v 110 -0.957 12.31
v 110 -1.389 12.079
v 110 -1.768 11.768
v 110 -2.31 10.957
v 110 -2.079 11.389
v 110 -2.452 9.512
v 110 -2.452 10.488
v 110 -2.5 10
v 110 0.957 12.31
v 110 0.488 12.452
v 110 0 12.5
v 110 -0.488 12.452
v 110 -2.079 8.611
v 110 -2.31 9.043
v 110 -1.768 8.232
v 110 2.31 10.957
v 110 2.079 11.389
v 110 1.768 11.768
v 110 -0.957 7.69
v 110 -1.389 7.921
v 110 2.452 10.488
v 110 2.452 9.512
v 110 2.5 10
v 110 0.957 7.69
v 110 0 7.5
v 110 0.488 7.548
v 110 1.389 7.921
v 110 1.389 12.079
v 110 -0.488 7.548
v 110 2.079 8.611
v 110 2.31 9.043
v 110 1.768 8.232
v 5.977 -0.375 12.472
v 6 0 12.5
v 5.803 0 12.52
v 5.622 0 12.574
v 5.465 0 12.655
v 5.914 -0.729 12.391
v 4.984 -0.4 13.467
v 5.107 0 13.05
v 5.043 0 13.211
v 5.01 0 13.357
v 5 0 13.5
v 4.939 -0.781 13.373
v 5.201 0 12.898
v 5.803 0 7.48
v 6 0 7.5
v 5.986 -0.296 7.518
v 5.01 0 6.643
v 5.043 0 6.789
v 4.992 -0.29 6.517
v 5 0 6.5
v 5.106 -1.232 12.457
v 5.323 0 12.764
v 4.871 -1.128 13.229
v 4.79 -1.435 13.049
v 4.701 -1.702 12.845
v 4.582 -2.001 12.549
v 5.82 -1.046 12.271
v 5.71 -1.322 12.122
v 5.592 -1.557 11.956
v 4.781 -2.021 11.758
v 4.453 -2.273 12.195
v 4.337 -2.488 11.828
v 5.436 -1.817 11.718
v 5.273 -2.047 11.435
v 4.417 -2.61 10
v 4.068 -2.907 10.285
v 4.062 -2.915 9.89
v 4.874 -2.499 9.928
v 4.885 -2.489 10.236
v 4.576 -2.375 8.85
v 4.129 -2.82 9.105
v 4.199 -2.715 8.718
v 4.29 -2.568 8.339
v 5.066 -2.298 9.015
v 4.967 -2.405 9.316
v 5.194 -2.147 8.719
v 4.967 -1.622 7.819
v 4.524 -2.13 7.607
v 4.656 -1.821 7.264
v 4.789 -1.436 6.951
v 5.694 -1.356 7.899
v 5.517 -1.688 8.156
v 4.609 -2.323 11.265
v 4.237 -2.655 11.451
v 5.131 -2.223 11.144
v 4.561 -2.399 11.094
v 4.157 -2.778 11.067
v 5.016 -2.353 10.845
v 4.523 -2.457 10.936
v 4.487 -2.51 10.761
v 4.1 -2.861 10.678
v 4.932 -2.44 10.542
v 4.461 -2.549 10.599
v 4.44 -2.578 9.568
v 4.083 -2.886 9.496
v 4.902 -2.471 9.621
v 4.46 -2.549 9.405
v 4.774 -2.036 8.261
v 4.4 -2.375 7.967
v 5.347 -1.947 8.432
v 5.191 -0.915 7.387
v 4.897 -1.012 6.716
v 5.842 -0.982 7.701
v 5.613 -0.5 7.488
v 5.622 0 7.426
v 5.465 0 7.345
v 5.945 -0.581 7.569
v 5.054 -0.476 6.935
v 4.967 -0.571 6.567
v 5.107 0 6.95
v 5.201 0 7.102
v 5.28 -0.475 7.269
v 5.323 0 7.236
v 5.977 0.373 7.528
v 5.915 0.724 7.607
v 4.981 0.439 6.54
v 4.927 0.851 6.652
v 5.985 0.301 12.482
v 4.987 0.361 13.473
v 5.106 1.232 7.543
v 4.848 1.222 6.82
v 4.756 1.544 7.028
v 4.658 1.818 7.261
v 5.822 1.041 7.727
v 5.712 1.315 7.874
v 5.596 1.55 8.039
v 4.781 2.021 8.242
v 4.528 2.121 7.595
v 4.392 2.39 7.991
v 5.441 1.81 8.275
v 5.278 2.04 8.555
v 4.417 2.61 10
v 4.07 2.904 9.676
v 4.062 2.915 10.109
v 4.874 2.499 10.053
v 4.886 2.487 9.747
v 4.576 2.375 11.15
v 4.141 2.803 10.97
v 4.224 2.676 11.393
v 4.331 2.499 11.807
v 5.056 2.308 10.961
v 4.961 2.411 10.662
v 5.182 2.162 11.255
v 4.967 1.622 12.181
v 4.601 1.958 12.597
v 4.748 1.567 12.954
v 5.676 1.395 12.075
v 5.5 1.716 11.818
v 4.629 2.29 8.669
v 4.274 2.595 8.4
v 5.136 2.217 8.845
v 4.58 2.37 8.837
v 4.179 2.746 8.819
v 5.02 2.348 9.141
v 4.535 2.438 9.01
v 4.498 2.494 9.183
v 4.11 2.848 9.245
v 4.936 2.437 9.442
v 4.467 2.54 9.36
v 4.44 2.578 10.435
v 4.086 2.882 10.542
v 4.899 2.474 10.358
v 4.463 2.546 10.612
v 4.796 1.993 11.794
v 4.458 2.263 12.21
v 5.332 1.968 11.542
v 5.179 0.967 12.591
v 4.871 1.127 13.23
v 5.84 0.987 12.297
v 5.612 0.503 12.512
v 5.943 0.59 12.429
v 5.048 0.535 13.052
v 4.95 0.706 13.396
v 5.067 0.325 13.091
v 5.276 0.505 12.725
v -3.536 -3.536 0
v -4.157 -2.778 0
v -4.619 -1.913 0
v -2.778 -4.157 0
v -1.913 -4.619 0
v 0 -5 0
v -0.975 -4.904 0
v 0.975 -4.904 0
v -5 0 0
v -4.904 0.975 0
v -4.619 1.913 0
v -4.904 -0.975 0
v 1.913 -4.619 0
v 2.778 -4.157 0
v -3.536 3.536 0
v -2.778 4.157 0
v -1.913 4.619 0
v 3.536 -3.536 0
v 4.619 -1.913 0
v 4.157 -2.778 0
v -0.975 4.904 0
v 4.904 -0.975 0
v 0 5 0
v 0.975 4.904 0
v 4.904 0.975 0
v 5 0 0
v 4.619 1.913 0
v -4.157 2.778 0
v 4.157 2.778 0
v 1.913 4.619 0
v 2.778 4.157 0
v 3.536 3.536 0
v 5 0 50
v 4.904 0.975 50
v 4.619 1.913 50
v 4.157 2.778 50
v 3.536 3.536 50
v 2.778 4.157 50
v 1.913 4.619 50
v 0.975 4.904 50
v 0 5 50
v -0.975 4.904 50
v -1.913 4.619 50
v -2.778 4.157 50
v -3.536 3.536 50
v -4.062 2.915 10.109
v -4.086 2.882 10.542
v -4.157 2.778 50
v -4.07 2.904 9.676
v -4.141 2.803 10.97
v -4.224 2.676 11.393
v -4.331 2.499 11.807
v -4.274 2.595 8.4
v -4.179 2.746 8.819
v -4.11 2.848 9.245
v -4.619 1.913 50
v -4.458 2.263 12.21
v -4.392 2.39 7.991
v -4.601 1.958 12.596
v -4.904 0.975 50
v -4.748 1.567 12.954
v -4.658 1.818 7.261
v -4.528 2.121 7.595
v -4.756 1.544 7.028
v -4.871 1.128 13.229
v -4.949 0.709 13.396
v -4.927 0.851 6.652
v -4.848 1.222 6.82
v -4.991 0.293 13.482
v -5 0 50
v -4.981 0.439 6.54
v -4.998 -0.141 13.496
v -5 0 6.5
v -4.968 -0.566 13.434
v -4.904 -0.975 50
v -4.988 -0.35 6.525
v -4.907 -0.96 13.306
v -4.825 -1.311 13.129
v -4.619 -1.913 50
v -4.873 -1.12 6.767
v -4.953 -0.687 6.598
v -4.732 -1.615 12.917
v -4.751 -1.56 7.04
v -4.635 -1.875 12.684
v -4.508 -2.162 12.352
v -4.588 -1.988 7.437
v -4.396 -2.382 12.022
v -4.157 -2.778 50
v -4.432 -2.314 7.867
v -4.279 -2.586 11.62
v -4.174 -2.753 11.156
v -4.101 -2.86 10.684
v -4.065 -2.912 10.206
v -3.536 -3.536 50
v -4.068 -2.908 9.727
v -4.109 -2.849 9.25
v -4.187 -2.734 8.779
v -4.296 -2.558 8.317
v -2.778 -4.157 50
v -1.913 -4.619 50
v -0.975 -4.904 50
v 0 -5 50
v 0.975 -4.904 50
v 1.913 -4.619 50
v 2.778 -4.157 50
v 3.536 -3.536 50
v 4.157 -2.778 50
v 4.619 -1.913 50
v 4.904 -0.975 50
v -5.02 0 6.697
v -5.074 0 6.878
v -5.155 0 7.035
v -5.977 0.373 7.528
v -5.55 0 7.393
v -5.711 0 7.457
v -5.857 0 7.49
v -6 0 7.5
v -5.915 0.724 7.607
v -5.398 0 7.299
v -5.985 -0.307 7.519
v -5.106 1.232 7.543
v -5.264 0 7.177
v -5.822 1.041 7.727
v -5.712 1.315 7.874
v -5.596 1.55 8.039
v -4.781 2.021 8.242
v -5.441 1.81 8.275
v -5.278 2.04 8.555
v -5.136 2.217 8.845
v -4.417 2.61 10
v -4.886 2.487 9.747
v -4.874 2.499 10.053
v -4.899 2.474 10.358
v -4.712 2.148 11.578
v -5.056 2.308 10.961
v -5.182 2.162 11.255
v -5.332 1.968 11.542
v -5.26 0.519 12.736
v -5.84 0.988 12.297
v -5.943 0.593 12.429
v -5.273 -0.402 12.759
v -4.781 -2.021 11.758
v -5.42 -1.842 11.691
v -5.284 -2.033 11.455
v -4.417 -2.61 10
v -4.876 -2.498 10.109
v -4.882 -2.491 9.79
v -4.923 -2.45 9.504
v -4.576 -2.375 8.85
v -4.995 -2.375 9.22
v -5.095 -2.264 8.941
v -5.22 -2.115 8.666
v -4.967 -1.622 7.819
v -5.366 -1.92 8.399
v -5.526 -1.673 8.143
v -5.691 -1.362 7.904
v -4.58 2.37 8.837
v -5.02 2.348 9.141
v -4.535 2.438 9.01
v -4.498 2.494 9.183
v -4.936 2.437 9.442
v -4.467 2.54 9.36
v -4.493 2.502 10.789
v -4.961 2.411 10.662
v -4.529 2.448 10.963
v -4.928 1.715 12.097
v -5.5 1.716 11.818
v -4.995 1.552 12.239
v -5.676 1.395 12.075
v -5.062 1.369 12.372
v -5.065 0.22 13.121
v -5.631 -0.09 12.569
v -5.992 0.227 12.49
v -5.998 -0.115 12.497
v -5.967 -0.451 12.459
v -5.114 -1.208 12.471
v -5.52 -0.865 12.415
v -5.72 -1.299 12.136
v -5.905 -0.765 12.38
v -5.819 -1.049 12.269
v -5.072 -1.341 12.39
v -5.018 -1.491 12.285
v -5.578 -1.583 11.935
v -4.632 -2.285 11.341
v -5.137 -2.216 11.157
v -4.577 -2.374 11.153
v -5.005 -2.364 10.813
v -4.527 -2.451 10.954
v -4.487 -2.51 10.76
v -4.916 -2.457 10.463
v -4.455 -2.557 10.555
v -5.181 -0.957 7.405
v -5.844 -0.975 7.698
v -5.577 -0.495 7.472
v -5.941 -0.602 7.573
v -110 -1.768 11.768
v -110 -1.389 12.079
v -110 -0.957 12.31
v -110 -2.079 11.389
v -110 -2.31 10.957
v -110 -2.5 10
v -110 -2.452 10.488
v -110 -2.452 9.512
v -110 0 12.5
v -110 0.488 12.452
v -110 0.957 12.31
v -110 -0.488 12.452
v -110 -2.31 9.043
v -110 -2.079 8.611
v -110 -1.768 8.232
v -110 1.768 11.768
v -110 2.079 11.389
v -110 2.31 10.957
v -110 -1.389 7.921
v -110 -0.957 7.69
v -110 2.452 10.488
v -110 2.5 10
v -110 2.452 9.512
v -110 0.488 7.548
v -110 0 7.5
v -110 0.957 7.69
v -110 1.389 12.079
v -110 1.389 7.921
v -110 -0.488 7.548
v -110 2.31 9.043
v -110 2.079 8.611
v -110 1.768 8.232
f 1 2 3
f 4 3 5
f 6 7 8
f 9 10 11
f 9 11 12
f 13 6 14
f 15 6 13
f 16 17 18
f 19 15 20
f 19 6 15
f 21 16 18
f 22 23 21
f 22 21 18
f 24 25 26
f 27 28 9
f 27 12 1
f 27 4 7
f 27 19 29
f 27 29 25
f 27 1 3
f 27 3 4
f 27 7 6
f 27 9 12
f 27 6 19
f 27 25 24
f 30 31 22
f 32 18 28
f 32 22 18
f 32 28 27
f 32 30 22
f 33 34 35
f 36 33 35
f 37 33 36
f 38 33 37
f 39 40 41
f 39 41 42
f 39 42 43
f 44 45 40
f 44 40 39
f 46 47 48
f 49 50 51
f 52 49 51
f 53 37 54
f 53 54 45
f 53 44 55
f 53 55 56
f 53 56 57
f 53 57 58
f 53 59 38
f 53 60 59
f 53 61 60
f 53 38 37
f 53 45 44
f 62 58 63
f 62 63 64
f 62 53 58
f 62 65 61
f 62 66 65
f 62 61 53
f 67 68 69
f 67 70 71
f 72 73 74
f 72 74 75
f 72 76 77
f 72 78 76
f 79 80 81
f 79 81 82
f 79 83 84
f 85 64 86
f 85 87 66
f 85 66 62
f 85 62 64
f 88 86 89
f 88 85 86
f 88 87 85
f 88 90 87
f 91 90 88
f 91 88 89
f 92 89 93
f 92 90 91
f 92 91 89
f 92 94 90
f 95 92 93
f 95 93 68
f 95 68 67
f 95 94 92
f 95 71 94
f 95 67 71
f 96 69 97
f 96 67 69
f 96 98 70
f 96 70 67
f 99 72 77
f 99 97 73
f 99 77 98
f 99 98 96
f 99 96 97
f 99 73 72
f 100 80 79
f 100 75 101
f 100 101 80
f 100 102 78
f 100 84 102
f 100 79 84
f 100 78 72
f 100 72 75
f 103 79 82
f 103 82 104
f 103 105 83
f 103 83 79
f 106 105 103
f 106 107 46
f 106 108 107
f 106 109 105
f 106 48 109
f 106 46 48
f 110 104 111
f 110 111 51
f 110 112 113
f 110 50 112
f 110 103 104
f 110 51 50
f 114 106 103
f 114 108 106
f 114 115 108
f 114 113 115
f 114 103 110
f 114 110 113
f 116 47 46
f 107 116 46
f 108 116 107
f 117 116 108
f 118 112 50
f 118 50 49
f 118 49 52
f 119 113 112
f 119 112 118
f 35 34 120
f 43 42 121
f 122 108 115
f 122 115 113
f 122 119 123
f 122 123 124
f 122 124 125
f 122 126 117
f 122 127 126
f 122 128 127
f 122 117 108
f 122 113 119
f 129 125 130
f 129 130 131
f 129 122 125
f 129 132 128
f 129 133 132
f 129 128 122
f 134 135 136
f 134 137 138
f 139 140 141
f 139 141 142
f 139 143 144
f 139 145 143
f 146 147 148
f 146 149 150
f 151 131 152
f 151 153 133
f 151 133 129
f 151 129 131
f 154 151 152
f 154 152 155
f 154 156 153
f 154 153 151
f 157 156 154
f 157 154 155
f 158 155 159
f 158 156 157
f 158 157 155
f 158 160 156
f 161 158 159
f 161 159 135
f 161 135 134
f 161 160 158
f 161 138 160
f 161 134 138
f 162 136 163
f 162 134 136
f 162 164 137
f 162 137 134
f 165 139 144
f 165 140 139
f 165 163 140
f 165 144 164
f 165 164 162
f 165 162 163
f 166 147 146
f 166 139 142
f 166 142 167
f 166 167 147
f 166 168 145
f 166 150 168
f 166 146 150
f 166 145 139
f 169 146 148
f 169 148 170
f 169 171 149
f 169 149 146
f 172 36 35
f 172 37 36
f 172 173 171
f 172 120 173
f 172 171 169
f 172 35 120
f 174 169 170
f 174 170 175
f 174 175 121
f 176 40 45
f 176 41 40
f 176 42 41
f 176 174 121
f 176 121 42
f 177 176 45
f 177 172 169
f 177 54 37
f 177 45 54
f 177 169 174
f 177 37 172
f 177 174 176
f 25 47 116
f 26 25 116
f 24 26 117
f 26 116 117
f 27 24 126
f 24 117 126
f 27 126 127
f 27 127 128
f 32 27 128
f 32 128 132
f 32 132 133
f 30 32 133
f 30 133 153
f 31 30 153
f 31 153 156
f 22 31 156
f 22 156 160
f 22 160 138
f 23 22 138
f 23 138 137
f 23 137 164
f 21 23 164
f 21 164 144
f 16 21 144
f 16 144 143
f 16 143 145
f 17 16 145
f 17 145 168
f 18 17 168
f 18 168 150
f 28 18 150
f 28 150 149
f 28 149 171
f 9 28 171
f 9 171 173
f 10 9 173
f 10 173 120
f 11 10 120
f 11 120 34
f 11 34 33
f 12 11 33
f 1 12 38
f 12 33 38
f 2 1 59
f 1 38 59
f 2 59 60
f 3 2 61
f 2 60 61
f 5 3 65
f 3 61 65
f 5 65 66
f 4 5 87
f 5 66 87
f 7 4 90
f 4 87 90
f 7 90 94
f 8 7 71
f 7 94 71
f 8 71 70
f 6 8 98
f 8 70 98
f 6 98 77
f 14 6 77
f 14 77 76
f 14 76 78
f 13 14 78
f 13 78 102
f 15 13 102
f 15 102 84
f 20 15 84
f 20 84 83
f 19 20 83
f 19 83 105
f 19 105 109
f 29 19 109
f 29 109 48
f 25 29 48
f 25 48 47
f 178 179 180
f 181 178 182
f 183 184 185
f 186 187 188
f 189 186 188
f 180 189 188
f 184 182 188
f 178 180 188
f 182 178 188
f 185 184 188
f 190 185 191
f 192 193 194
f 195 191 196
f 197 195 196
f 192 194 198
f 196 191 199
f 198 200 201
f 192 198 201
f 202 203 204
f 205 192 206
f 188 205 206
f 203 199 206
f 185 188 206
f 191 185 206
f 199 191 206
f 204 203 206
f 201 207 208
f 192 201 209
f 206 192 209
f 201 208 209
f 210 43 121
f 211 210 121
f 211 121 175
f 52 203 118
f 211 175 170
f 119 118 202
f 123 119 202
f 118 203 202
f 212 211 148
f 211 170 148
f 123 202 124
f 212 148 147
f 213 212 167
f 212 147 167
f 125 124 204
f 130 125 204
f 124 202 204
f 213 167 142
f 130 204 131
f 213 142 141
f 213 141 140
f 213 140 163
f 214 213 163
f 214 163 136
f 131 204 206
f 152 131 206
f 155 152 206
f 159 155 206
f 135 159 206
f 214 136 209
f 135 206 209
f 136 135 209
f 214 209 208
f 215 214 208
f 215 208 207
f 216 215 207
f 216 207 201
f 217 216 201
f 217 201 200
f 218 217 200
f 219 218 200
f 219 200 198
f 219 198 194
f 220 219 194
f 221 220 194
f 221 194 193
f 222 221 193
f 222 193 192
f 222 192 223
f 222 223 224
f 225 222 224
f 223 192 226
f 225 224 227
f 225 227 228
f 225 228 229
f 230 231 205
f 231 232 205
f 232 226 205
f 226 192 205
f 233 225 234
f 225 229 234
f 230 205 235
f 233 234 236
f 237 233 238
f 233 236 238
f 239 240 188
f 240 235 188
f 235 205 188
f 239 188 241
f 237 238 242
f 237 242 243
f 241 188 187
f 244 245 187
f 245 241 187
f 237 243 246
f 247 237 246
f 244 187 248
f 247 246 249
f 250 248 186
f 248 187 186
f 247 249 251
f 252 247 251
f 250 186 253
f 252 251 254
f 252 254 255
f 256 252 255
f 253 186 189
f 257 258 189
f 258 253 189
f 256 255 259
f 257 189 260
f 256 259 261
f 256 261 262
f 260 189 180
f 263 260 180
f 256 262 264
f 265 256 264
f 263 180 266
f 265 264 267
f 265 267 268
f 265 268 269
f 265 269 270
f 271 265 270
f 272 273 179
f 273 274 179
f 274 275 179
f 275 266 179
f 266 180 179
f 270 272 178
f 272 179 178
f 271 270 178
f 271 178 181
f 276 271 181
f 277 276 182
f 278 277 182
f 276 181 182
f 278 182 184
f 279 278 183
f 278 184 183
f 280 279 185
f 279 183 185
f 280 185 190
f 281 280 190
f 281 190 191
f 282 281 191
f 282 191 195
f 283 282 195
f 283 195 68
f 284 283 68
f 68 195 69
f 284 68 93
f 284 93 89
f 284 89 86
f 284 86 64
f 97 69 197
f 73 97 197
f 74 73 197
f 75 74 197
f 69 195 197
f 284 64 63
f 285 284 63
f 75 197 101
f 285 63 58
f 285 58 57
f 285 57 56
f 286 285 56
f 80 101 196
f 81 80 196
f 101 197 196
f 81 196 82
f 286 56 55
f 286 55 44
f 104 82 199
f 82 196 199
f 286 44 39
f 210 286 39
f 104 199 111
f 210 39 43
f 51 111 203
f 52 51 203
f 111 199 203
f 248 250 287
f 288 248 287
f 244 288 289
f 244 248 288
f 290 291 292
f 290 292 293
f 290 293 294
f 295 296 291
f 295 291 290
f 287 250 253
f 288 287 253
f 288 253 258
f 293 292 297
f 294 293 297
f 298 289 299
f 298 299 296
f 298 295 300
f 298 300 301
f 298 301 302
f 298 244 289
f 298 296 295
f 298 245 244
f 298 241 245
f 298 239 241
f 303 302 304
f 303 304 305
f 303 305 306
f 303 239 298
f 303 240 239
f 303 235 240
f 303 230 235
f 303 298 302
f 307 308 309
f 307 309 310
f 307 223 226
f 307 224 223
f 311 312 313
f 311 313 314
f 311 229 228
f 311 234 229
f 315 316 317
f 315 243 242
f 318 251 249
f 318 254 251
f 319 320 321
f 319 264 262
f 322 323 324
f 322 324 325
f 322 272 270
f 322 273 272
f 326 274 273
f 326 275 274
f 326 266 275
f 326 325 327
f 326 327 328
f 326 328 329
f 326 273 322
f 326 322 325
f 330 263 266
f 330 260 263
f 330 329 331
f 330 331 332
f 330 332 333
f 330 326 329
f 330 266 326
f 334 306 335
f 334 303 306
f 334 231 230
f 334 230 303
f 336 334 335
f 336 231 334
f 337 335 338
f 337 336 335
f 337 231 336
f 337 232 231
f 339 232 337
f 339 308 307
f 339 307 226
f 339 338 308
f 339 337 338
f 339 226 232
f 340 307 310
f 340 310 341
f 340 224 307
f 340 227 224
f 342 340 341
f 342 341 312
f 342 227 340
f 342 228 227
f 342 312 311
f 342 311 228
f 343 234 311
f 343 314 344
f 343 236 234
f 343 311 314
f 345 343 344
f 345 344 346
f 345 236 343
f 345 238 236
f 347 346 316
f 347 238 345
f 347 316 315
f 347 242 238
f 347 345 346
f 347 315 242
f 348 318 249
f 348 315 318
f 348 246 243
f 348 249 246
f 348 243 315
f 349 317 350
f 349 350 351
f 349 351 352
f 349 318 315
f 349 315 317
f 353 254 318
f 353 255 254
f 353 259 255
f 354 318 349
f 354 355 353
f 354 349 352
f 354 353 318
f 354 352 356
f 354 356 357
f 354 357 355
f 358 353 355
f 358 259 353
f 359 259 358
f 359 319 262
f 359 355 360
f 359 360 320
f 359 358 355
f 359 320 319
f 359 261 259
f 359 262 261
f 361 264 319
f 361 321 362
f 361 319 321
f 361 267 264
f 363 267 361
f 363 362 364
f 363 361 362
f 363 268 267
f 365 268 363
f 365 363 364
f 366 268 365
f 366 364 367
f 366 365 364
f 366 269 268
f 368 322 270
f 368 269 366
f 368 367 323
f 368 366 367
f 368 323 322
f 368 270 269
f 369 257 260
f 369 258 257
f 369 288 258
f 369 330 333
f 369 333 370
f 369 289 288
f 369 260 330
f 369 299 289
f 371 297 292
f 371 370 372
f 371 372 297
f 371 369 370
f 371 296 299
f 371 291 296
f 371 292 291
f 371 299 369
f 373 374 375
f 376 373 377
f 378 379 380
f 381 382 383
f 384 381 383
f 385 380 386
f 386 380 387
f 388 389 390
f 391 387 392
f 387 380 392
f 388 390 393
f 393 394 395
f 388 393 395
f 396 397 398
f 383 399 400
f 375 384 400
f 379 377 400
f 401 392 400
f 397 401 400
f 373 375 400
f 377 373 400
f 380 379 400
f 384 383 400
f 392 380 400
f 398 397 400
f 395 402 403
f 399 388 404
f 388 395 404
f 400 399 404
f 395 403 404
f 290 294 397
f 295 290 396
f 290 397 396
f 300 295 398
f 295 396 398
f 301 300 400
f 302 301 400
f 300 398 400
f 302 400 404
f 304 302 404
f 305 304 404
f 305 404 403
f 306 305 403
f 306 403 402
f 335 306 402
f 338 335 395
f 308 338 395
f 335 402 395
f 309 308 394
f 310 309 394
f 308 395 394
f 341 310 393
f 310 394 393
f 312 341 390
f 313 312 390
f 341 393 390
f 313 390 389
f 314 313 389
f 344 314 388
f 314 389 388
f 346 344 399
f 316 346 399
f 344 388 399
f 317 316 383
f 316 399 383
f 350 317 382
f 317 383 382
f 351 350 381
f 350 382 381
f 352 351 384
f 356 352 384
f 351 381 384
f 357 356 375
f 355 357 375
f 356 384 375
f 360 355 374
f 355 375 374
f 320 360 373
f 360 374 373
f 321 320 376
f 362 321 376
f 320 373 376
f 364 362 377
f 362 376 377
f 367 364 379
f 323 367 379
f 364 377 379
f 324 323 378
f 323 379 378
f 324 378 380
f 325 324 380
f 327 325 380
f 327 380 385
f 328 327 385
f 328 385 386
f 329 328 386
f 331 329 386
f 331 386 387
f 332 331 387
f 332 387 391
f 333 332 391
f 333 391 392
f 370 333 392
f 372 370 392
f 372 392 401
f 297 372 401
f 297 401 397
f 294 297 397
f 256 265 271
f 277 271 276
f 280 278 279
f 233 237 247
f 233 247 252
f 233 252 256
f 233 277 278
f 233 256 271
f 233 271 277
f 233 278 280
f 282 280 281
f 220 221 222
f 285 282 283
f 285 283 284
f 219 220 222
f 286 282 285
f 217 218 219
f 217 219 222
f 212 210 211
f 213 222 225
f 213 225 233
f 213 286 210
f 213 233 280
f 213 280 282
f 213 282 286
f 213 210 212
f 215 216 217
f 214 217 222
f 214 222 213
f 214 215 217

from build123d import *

# Parameters (mm, degrees)
SKETCH1_R                = 5
BOSS_EXTRUDE1_DEPTH      = 50
BOSS_EXTRUDE2_DEPTH      = 110
BOSS_EXTRUDE2_DEPTH_BACK = 110
SKETCH2_R                = 2.5
FILLET1_R                = 1


with BuildPart() as part:
    # Sketch1 → Boss-Extrude1 (new body)
    with BuildSketch(Plane.XY):
        Circle(SKETCH1_R)
    extrude(amount=BOSS_EXTRUDE1_DEPTH)

    # Sketch2 → Boss-Extrude2 (add, two sides: drawn at the far end of the back side and taken through both)
    with BuildSketch(Plane(origin=(0, 0, 0), x_dir=(0, 0, -1), z_dir=(1, 0, 0)).offset(-BOSS_EXTRUDE2_DEPTH_BACK)):
        with Locations((-10, 0)):
            Circle(SKETCH2_R)
    extrude(amount=BOSS_EXTRUDE2_DEPTH + BOSS_EXTRUDE2_DEPTH_BACK)

    # Fillet1
    fillet1_edges = [part.edges().sort_by_distance(p)[0] for p in [
        (-4.999960513, -0.019871133, 12.499921026),
        (4.330127047, 2.499999952, 10.000491239),
    ]]
    fillet(fillet1_edges, radius=FILLET1_R - 0.0001)  # a hair under: the kernel refuses the full size


solid = part.part
